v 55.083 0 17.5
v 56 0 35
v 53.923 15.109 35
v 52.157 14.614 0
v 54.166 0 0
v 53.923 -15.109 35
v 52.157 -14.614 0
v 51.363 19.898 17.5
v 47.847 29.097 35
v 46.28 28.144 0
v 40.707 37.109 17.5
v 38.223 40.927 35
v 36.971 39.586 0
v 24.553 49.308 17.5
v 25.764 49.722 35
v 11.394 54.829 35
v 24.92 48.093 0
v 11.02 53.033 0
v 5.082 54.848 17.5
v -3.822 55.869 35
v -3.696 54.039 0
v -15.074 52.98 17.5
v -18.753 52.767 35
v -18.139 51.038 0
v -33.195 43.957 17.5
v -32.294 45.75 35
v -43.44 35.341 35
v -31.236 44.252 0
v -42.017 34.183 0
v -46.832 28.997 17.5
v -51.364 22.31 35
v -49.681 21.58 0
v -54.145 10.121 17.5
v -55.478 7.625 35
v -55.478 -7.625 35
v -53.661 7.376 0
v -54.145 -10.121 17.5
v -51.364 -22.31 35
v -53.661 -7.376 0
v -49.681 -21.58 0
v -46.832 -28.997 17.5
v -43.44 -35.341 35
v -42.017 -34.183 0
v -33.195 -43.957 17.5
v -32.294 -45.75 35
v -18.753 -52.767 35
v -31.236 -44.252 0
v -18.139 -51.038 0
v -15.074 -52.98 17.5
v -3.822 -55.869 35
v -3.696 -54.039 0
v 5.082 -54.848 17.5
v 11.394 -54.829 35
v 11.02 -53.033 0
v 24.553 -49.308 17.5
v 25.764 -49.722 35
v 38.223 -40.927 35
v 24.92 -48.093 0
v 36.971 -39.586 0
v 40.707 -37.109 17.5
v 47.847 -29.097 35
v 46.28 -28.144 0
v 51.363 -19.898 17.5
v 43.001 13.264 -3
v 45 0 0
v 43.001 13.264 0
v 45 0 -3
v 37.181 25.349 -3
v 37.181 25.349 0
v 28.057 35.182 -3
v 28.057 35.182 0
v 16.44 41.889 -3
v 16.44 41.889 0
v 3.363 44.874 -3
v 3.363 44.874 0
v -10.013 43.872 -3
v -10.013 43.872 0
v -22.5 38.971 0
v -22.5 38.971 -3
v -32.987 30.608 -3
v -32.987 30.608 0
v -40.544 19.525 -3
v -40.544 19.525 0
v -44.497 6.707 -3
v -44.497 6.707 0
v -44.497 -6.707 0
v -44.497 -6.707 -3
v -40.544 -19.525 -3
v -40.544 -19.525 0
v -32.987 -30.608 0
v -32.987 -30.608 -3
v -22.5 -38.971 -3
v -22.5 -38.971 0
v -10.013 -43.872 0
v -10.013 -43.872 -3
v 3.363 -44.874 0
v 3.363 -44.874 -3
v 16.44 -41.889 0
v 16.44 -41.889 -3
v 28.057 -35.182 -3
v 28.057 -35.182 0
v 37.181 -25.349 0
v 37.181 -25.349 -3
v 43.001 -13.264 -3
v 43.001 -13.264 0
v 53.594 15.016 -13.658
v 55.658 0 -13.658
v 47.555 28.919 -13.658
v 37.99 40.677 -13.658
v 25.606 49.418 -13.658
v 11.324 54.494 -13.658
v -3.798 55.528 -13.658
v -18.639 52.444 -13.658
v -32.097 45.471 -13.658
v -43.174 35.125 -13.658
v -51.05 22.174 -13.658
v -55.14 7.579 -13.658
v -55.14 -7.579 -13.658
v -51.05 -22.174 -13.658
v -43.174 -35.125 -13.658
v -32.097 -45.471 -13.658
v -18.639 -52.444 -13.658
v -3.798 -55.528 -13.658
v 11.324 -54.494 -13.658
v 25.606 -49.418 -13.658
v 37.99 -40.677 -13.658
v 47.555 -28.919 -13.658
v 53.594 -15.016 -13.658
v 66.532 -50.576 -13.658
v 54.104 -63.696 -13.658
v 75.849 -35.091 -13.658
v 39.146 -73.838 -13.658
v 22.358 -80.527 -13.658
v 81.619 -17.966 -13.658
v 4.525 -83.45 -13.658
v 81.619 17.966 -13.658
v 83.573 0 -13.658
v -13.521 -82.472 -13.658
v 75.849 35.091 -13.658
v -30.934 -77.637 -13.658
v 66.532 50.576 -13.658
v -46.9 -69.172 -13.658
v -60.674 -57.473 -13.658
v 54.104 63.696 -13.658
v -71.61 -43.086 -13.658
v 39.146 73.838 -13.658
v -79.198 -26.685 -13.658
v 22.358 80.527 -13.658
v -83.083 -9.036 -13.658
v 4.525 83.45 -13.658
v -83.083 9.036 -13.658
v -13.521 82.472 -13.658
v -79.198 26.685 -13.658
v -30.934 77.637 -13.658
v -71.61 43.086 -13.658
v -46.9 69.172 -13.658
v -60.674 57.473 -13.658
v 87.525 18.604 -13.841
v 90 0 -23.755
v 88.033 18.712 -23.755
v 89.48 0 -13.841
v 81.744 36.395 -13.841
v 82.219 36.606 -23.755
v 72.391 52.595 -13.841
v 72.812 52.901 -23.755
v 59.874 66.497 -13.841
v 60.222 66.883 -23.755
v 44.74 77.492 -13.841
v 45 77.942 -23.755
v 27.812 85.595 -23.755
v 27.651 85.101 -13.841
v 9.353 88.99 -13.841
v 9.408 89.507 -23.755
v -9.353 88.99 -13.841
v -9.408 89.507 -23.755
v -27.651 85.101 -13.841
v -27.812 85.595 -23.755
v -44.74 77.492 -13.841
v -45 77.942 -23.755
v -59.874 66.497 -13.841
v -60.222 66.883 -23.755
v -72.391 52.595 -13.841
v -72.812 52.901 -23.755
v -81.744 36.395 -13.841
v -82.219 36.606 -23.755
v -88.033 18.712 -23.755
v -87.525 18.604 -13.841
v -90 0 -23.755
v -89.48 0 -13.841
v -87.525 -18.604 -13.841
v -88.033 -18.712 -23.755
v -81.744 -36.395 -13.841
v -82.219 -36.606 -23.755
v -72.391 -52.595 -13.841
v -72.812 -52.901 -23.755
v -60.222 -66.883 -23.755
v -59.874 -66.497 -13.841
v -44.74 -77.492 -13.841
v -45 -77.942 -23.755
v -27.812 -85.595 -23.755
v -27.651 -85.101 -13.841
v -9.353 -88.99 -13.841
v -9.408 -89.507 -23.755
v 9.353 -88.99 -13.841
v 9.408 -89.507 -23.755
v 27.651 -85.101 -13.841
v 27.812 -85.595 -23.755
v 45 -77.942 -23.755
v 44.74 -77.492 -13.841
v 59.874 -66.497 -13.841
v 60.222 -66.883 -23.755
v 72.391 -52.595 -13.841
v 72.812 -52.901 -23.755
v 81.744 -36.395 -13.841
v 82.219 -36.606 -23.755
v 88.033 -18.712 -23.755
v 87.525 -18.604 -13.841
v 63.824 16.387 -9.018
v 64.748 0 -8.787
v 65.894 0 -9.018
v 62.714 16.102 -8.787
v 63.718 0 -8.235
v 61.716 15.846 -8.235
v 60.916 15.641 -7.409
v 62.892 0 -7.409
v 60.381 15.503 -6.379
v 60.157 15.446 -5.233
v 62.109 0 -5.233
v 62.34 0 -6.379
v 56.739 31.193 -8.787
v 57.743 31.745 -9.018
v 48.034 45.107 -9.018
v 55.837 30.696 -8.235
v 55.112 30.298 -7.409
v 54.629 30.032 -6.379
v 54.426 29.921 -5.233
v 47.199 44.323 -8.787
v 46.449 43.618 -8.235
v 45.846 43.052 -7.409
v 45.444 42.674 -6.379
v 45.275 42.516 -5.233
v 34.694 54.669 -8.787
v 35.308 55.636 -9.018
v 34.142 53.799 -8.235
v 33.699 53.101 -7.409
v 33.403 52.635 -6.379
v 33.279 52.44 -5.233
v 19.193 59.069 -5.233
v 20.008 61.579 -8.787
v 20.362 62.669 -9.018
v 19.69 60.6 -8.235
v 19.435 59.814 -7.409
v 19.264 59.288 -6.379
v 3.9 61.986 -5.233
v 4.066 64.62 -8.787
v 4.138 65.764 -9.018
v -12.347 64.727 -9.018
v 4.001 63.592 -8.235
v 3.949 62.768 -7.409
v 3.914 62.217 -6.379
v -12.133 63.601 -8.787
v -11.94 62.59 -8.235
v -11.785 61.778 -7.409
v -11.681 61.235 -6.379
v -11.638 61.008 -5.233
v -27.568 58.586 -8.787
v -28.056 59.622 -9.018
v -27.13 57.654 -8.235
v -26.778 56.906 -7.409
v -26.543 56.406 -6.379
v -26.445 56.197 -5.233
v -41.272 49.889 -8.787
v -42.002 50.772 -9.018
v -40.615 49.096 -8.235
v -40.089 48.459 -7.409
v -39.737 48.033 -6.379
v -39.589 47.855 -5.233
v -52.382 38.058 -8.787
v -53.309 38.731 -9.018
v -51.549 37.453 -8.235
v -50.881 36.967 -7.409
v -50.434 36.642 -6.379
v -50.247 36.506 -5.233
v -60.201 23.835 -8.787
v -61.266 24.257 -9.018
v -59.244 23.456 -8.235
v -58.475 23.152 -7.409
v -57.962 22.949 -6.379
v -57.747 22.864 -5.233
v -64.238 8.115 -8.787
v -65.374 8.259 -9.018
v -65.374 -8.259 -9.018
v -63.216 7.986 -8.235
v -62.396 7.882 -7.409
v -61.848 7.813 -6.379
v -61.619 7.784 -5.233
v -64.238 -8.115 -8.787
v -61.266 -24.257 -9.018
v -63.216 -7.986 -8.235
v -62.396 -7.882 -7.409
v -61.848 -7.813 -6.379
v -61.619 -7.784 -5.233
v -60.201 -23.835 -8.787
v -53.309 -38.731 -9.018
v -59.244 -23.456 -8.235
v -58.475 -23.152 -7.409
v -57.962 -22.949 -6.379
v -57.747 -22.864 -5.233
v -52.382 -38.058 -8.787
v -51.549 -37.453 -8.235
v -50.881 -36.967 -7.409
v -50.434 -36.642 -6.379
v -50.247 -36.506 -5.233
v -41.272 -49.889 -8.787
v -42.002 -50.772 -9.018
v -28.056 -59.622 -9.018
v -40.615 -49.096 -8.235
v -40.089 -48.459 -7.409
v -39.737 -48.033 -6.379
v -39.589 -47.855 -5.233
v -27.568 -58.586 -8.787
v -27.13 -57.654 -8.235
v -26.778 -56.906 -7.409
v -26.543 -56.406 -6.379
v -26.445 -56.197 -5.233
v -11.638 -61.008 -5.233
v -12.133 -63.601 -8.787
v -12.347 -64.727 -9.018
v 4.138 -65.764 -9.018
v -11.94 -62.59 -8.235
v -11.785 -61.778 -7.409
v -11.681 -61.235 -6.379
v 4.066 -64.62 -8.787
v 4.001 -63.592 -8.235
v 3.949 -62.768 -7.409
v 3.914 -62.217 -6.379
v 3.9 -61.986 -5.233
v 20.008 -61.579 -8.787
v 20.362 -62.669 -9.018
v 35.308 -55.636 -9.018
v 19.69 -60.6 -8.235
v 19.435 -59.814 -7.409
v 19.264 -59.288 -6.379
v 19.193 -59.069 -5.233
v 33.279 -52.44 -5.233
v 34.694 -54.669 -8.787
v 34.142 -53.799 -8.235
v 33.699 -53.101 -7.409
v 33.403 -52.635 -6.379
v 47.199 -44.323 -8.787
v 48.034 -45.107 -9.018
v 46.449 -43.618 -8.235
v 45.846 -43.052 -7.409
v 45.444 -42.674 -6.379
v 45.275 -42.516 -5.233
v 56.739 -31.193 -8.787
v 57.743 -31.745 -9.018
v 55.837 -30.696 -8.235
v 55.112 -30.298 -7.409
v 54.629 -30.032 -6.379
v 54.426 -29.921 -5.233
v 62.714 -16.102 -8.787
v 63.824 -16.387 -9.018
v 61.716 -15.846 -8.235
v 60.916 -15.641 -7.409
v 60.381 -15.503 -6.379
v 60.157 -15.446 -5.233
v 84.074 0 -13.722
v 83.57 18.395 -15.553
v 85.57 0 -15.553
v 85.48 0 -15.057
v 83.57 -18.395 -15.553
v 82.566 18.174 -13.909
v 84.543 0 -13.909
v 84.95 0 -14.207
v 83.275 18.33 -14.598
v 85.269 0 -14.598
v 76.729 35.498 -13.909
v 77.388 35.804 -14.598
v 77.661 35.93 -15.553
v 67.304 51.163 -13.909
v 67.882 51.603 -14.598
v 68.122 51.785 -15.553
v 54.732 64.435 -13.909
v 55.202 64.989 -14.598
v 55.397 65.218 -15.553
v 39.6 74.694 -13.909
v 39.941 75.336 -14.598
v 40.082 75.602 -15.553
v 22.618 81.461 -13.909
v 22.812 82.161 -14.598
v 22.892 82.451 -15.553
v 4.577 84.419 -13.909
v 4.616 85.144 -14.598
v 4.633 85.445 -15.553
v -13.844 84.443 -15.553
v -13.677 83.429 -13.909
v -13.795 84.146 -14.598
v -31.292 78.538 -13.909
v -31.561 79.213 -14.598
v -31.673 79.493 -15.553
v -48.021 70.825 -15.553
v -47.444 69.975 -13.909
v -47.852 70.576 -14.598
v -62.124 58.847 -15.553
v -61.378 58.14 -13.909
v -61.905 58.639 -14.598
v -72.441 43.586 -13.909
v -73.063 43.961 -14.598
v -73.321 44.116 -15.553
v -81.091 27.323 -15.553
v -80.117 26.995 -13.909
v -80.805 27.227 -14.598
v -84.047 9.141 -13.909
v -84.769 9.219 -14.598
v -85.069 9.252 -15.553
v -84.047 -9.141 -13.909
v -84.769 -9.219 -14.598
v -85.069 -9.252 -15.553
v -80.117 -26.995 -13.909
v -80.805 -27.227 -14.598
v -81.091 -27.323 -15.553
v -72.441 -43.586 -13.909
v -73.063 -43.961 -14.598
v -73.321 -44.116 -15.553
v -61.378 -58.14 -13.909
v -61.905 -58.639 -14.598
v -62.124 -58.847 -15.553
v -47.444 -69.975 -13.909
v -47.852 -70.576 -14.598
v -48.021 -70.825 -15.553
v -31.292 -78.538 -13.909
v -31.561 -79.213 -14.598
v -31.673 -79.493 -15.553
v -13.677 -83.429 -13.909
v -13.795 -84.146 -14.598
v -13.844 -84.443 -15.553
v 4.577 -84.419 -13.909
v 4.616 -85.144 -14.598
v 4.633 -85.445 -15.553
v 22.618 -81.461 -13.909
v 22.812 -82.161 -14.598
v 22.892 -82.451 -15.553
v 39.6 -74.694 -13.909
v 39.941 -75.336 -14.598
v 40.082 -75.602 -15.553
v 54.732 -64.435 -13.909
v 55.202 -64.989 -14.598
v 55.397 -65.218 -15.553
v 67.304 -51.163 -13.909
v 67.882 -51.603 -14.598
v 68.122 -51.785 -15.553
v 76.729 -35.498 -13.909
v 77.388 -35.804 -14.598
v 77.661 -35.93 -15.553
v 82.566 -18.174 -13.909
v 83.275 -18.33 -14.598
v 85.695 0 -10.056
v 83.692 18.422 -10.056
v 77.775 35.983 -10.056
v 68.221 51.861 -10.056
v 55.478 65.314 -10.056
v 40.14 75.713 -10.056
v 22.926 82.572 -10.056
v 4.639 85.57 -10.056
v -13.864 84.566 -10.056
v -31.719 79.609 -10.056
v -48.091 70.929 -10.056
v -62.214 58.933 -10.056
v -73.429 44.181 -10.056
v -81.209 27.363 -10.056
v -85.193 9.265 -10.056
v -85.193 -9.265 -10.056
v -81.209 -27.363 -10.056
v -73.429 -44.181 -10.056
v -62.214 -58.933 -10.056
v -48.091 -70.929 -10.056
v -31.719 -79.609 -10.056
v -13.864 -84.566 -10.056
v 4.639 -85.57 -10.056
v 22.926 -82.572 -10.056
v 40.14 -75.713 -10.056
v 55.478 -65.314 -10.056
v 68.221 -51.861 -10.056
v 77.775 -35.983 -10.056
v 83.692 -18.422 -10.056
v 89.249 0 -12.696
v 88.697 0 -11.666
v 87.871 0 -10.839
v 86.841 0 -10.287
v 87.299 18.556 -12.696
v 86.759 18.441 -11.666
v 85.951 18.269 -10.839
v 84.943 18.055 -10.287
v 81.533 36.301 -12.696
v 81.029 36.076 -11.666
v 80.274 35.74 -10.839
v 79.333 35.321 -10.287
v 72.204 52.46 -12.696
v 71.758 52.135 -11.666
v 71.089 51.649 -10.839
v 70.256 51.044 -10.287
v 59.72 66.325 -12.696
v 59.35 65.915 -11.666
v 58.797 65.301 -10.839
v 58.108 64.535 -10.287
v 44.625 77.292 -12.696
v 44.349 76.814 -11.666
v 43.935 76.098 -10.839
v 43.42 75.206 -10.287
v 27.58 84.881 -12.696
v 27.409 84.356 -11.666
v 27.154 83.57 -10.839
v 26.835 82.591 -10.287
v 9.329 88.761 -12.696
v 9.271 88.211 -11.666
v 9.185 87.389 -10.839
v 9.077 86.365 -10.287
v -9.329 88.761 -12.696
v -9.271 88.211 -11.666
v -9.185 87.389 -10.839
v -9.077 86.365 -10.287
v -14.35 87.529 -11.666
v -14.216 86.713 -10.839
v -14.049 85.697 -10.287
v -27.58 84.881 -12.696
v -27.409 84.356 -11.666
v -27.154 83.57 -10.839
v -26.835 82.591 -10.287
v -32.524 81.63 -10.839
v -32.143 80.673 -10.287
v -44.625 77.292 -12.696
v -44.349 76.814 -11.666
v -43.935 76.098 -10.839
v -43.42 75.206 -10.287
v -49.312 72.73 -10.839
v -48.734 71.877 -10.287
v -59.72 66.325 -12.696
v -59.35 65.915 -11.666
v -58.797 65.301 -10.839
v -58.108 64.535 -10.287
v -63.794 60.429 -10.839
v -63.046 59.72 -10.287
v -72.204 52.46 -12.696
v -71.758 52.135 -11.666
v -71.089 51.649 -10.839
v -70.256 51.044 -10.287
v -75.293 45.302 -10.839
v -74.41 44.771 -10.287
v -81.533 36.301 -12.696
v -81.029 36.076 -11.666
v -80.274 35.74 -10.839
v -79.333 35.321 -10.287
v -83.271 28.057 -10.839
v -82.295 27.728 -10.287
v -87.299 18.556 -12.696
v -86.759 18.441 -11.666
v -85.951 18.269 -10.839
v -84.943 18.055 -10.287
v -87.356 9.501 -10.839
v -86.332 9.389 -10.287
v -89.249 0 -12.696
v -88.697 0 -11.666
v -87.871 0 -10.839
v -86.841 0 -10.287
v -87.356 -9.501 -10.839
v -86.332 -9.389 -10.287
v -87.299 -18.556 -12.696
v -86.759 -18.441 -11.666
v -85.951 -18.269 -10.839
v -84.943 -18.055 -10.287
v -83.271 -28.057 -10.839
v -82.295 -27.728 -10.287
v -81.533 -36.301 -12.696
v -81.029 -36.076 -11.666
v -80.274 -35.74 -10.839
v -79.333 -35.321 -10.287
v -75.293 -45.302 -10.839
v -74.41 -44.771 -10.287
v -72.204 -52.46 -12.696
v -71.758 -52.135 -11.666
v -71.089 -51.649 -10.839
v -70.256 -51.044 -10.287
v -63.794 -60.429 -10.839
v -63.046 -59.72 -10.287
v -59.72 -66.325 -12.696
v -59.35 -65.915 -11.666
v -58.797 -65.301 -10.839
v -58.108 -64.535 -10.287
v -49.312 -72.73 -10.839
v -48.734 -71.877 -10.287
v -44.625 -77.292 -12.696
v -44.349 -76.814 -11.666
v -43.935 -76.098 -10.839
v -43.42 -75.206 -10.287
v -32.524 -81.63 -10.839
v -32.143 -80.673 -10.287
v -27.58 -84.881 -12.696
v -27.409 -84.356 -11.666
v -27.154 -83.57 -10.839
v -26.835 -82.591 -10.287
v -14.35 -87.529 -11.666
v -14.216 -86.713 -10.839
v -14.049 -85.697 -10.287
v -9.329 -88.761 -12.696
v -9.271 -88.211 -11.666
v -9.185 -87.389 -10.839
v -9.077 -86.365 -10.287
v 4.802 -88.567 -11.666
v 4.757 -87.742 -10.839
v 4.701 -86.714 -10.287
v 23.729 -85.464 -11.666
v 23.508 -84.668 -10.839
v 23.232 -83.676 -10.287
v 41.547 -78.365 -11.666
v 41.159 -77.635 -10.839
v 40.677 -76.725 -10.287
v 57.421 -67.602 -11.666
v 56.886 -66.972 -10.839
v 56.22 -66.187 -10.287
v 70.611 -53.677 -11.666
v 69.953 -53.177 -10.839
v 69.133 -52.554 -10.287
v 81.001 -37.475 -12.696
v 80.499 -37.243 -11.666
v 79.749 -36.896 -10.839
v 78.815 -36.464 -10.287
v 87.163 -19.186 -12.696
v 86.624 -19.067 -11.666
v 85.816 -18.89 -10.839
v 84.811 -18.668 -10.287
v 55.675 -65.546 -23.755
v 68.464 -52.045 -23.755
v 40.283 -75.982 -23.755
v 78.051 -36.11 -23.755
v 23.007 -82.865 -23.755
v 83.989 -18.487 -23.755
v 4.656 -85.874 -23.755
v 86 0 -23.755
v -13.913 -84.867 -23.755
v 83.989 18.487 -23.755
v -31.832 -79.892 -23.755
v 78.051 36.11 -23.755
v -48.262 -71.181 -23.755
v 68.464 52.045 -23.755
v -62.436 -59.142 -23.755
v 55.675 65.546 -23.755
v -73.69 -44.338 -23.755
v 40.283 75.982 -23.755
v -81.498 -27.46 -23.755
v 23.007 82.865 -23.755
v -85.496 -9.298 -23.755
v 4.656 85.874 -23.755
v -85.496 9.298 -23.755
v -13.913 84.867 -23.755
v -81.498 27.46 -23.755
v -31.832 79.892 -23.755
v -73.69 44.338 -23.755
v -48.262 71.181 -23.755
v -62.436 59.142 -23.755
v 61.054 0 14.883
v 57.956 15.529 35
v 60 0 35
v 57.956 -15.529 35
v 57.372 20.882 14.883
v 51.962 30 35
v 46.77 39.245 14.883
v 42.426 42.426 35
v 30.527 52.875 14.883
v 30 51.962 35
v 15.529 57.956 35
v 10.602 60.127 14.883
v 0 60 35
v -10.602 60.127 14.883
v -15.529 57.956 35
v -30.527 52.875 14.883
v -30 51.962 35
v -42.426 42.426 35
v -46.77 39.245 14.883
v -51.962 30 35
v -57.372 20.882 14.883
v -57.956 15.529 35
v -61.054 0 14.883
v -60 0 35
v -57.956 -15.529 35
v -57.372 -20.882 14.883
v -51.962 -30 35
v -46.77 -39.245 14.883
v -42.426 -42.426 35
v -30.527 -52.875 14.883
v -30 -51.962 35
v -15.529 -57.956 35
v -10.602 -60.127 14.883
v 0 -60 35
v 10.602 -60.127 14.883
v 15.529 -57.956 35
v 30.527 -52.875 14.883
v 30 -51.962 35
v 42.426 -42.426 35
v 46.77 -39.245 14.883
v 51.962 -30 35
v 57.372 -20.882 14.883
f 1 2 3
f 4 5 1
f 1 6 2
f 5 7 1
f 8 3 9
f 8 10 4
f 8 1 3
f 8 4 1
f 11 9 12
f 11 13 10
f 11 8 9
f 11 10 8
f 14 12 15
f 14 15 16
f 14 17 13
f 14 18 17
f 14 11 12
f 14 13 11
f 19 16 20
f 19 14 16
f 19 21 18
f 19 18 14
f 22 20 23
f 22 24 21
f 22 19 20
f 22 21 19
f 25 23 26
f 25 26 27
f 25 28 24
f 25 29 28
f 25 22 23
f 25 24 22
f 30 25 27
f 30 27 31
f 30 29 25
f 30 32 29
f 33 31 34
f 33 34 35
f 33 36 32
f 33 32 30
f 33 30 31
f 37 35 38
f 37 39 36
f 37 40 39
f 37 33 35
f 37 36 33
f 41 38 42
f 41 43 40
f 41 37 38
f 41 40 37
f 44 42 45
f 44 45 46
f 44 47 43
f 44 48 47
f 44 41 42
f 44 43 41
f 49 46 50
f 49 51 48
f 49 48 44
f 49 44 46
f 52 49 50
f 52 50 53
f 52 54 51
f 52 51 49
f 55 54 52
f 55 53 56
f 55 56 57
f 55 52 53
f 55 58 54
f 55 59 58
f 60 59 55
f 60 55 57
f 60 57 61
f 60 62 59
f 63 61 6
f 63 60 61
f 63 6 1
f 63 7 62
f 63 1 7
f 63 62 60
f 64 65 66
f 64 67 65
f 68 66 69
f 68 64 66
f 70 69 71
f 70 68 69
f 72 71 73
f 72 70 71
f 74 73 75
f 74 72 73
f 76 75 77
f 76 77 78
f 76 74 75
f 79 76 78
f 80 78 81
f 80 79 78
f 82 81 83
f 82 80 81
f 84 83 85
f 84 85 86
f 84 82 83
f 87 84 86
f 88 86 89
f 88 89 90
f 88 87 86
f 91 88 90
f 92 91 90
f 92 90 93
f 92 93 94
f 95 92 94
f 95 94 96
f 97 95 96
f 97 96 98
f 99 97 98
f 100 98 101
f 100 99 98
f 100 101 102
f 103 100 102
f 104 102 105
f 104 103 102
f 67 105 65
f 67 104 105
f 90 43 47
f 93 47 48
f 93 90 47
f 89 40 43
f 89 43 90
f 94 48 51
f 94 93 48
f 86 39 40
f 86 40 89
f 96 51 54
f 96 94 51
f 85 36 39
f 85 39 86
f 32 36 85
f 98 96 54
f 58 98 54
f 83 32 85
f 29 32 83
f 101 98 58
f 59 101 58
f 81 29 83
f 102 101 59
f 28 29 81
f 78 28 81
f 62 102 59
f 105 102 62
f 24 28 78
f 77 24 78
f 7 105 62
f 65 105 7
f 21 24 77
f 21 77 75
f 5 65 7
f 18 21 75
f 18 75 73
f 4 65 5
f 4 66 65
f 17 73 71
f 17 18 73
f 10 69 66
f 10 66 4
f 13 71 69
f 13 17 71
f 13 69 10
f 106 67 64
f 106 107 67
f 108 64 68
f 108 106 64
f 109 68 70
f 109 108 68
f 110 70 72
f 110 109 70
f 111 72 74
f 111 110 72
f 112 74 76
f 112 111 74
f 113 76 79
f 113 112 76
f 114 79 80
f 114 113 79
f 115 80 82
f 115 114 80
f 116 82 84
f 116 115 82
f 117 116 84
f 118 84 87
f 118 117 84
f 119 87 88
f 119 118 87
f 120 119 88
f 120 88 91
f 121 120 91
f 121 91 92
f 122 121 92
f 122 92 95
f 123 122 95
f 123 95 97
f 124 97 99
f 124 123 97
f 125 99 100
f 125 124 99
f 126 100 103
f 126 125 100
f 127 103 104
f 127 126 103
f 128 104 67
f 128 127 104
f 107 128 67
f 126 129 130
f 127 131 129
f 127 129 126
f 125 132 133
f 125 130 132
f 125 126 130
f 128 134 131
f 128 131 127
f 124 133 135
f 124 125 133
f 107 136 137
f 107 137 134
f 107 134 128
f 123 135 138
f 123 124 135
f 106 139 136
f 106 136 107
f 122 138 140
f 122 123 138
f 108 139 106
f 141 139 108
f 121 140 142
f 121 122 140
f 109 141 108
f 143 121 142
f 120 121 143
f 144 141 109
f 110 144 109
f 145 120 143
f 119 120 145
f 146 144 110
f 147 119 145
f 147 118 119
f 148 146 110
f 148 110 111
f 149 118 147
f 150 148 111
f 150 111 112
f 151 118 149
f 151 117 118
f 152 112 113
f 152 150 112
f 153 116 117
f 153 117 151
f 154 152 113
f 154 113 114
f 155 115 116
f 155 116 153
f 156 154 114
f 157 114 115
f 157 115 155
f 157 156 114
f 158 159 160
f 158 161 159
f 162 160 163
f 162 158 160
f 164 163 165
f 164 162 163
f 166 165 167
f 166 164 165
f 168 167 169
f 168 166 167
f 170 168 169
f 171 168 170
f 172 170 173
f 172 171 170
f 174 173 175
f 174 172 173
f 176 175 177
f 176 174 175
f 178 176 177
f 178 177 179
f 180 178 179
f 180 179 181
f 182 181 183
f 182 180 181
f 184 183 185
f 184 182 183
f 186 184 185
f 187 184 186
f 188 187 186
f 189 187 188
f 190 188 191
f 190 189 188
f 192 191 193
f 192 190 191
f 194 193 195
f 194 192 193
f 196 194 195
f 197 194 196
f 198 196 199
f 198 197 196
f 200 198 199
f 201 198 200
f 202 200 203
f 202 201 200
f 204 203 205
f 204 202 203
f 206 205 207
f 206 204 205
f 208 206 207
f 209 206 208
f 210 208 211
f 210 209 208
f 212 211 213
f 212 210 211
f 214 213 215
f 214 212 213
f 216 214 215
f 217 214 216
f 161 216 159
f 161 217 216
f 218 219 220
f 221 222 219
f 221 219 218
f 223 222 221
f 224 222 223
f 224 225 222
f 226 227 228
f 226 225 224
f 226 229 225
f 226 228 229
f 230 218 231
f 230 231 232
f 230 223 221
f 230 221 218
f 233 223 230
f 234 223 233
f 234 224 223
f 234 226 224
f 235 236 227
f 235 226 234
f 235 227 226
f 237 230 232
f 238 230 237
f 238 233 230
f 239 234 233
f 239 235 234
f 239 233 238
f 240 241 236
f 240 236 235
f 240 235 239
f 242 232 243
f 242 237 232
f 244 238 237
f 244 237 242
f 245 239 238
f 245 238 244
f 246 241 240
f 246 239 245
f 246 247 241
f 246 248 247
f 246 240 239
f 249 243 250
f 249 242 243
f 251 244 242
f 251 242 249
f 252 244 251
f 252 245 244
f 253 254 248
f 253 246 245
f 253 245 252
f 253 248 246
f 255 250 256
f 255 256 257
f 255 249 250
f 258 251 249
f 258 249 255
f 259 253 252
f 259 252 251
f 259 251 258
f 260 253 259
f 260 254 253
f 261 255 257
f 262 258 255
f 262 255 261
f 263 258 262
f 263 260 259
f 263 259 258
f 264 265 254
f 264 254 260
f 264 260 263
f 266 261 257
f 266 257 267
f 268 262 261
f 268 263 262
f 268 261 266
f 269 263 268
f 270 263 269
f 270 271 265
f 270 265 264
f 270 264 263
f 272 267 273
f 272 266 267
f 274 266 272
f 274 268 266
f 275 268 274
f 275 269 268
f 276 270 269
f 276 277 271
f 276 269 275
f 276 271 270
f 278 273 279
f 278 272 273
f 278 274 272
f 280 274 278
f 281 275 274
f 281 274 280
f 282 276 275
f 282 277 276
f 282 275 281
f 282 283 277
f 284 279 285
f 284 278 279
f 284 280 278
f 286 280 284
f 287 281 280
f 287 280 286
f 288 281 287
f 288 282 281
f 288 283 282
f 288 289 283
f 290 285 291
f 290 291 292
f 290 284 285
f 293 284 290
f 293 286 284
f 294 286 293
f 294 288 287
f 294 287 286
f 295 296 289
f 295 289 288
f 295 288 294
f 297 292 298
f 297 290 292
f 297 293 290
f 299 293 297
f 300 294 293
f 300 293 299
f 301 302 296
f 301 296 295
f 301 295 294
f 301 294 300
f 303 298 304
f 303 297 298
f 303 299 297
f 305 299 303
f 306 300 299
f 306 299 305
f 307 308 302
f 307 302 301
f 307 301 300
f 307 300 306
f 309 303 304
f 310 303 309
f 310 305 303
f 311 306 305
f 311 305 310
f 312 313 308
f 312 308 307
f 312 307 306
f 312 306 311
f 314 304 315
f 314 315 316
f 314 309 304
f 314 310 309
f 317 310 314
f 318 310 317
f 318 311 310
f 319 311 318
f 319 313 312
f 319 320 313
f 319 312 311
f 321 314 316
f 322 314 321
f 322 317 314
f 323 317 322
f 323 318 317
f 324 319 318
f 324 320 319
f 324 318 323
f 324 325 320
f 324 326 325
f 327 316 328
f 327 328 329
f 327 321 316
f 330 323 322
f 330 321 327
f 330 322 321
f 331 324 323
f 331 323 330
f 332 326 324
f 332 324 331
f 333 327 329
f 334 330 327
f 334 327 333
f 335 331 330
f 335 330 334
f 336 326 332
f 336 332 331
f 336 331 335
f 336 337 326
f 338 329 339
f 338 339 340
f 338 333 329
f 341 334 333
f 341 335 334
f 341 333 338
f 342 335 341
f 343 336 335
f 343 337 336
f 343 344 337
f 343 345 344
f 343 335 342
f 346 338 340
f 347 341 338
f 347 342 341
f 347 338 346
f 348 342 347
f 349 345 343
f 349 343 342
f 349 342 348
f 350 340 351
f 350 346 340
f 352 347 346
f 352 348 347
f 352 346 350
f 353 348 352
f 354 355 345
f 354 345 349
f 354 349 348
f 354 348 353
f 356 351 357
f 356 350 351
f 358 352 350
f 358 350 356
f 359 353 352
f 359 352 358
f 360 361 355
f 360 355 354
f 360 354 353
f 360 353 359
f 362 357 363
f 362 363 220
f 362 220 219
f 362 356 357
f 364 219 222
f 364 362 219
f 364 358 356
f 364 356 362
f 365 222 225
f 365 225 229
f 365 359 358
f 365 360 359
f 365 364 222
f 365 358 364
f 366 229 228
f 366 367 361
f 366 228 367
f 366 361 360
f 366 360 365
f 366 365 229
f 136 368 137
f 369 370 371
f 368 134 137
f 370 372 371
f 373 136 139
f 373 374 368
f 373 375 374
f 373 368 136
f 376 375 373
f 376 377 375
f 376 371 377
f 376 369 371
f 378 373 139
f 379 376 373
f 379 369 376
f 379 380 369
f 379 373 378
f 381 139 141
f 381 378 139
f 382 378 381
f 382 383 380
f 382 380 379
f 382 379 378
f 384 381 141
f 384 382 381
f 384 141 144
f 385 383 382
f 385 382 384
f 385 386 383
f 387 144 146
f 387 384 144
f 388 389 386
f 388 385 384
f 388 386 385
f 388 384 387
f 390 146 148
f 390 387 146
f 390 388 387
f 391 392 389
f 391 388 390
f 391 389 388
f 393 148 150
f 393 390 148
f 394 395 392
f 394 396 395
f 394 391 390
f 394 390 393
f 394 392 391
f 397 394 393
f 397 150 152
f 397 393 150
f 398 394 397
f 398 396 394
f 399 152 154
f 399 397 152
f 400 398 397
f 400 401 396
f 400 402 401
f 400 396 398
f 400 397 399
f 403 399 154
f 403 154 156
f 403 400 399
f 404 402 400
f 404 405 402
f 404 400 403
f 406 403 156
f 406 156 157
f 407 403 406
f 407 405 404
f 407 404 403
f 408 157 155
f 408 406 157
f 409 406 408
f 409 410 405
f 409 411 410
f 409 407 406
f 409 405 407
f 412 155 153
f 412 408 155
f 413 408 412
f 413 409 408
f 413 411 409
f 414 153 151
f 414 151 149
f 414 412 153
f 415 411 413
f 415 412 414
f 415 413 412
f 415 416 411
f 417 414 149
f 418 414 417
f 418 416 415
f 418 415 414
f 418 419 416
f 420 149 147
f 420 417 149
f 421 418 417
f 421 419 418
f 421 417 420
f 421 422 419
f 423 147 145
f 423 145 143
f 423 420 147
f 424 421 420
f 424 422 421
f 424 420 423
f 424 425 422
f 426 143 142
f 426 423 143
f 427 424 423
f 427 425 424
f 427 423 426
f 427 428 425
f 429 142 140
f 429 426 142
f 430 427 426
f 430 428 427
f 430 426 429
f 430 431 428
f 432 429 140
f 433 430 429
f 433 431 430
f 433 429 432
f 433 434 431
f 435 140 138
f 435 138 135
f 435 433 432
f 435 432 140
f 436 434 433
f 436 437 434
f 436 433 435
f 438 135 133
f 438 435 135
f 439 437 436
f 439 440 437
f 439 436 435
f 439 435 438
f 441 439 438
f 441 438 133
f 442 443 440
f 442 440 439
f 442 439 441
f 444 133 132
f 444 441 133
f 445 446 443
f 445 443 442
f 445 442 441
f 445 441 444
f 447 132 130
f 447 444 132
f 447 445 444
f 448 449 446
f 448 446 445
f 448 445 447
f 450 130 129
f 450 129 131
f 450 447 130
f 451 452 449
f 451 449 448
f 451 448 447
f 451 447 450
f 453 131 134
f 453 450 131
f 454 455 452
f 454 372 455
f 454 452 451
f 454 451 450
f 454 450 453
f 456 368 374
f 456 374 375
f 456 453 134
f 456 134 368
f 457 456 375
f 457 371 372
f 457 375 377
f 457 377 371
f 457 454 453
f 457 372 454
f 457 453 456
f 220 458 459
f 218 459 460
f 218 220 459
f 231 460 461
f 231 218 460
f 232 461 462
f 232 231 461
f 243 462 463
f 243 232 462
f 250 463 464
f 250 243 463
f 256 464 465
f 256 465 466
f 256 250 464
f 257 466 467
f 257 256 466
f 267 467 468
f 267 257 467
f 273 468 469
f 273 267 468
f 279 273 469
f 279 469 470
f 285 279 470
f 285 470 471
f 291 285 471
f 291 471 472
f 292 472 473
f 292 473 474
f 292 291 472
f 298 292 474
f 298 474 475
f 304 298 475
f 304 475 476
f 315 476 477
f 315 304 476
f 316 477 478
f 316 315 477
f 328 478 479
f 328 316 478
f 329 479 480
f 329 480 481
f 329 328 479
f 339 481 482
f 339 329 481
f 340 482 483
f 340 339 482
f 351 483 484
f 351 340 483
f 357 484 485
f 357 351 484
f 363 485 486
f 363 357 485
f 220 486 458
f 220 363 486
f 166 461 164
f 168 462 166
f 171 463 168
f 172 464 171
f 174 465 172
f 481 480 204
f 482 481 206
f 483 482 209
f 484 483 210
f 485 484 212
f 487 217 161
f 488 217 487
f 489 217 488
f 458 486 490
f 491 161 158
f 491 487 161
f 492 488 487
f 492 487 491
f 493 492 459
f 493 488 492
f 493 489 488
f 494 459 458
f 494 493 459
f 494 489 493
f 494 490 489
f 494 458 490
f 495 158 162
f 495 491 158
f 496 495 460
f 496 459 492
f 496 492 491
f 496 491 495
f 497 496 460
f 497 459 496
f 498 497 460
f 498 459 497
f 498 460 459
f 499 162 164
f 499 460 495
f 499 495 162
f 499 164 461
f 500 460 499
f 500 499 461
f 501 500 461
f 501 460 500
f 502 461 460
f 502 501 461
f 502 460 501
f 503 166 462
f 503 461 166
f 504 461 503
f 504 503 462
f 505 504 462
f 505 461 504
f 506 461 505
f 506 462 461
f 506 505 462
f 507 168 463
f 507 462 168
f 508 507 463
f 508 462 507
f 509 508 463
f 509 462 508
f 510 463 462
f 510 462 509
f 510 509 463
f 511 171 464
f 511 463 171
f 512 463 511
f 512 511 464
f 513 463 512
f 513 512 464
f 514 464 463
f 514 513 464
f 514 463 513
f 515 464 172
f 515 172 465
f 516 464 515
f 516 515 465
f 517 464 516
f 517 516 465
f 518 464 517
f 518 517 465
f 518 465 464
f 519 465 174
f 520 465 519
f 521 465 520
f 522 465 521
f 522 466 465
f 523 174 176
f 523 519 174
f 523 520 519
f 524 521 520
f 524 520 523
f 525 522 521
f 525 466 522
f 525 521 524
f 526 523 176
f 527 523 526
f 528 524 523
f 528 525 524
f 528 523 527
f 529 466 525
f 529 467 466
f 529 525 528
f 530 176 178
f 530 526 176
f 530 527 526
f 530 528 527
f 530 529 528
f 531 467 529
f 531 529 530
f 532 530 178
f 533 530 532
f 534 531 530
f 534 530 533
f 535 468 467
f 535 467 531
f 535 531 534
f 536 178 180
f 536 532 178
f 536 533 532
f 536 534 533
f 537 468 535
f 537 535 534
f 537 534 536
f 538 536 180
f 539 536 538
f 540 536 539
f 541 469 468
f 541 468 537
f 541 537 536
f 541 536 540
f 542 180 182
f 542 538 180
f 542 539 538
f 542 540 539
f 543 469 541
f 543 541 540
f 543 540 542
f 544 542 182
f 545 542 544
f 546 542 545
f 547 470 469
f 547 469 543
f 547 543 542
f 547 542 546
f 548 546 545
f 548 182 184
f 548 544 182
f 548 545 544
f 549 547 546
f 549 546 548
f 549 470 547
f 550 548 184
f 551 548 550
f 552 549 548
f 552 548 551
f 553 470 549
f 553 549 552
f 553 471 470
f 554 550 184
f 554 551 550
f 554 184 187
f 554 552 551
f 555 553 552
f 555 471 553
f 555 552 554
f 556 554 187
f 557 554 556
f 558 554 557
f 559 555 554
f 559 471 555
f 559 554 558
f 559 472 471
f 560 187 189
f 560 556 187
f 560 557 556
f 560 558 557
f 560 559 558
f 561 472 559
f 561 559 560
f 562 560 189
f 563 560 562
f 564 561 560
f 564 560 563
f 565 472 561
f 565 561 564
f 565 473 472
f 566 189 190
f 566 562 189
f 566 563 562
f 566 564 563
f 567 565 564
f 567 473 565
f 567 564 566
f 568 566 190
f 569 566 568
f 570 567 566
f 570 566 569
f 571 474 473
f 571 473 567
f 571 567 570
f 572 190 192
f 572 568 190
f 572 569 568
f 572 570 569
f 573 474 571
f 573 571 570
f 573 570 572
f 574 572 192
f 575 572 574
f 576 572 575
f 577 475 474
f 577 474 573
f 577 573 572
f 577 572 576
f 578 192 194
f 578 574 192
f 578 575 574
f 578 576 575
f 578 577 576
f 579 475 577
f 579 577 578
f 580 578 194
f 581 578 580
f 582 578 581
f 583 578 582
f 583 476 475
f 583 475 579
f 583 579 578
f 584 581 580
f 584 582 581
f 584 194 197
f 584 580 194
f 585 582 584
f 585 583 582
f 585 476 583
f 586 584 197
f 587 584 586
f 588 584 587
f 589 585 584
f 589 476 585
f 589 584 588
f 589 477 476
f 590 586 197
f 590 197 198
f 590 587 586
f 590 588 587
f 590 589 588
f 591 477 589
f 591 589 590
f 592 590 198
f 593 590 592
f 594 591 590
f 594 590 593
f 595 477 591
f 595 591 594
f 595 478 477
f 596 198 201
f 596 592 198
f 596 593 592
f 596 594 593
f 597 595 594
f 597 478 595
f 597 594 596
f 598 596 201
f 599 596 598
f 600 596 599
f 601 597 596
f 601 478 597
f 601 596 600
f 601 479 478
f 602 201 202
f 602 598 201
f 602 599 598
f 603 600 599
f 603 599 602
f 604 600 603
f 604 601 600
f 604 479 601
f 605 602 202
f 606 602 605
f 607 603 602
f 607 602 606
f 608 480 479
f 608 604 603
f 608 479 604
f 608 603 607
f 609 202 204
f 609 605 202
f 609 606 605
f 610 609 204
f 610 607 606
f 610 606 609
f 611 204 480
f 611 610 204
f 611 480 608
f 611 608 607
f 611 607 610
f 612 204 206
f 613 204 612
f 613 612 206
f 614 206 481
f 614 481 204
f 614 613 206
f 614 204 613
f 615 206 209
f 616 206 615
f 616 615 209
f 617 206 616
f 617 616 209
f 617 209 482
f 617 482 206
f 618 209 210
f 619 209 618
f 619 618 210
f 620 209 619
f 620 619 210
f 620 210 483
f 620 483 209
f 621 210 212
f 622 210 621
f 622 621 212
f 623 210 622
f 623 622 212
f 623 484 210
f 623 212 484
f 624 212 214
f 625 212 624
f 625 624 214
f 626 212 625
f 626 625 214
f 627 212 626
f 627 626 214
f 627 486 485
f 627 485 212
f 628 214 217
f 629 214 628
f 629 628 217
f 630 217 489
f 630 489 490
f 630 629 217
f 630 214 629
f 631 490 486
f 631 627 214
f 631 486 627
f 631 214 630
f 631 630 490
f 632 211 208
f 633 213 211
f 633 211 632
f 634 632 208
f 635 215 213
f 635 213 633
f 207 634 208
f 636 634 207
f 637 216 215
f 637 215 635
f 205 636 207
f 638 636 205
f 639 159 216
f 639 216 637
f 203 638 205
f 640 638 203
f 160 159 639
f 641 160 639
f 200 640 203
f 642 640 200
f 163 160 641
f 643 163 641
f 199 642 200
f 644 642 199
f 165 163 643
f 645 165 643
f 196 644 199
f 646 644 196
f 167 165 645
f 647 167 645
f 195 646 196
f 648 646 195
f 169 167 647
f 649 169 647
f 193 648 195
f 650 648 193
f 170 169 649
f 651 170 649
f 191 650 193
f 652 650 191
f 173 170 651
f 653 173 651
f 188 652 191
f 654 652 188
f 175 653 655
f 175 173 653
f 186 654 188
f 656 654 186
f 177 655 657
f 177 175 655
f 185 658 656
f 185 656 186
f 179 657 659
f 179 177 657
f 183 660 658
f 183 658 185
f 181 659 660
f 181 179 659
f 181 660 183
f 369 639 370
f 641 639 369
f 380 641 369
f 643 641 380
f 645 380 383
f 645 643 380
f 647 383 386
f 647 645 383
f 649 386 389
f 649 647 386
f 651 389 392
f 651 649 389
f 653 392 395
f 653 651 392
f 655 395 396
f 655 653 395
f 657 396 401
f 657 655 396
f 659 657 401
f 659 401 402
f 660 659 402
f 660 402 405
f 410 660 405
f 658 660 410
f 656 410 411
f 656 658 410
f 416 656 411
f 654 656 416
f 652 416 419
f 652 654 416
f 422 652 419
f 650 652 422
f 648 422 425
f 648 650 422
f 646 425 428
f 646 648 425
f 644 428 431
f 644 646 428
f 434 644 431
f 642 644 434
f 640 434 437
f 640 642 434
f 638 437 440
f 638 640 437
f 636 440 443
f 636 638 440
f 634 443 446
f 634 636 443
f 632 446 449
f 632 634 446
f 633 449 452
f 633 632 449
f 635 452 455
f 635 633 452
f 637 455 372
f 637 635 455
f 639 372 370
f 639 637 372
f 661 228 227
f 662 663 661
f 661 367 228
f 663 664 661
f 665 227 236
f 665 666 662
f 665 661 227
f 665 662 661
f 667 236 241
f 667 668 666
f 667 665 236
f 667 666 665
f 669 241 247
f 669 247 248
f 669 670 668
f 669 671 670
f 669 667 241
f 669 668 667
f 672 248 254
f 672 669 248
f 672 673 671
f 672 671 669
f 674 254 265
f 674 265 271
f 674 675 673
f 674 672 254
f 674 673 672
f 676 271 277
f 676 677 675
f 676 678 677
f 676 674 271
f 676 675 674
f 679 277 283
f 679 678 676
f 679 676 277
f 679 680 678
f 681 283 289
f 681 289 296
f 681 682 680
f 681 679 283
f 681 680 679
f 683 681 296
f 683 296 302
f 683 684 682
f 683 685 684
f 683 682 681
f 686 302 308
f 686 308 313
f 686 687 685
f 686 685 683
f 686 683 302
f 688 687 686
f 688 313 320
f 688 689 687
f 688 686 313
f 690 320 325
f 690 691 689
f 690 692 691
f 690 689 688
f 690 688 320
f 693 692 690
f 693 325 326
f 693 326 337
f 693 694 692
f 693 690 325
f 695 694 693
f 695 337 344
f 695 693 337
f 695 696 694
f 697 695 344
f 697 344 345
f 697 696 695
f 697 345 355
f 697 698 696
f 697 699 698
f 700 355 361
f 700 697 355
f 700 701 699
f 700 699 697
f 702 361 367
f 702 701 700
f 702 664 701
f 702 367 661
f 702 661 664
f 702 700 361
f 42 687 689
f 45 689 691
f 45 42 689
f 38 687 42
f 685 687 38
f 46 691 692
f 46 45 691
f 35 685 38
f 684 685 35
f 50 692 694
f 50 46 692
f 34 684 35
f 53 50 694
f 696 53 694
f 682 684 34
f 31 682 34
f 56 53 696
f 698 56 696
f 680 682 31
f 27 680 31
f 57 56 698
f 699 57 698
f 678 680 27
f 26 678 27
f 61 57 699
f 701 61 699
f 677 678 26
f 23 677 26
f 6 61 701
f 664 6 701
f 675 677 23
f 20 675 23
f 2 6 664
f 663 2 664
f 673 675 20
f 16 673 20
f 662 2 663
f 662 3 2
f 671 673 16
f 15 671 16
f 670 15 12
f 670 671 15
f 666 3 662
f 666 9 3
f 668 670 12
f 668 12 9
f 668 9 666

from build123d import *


with BuildPart() as f1:
    # F0 (on Front) → F1 (revolve)
    with BuildSketch(Plane.XZ):
        with BuildLine():
            Line((54.165728, 0), (45, 0))
            Line((45, 0), (45, -3))
            Line((45, -3), (55.657942, -13.657942))
            Line((55.657942, -13.657942), (83.572924, -13.657942))
            ThreePointArc((83.572924, -13.657942), (84.949633, -14.207193), (85.570183, -15.55327))
            Line((85.570183, -15.55327), (86, -23.754671))
            Line((86, -23.754671), (90, -23.754671))
            Line((90, -23.754671), (89.480465, -13.841344))
            ThreePointArc((89.480465, -13.841344), (88.314374, -11.222261), (85.69529, -10.05617))
            Line((85.69529, -10.05617), (65.893709, -9.018413))
            ThreePointArc((65.893709, -9.018413), (63.274626, -7.852322), (62.108535, -5.233239))
            Line((62.108535, -5.233239), (60, 35))
            Line((60, 35), (56, 35))
            Line((56, 35), (54.165728, 0))
        make_face()
    revolve(axis=Axis((0, 0, -2), (0, 0, 1)))


solid = f1.part
